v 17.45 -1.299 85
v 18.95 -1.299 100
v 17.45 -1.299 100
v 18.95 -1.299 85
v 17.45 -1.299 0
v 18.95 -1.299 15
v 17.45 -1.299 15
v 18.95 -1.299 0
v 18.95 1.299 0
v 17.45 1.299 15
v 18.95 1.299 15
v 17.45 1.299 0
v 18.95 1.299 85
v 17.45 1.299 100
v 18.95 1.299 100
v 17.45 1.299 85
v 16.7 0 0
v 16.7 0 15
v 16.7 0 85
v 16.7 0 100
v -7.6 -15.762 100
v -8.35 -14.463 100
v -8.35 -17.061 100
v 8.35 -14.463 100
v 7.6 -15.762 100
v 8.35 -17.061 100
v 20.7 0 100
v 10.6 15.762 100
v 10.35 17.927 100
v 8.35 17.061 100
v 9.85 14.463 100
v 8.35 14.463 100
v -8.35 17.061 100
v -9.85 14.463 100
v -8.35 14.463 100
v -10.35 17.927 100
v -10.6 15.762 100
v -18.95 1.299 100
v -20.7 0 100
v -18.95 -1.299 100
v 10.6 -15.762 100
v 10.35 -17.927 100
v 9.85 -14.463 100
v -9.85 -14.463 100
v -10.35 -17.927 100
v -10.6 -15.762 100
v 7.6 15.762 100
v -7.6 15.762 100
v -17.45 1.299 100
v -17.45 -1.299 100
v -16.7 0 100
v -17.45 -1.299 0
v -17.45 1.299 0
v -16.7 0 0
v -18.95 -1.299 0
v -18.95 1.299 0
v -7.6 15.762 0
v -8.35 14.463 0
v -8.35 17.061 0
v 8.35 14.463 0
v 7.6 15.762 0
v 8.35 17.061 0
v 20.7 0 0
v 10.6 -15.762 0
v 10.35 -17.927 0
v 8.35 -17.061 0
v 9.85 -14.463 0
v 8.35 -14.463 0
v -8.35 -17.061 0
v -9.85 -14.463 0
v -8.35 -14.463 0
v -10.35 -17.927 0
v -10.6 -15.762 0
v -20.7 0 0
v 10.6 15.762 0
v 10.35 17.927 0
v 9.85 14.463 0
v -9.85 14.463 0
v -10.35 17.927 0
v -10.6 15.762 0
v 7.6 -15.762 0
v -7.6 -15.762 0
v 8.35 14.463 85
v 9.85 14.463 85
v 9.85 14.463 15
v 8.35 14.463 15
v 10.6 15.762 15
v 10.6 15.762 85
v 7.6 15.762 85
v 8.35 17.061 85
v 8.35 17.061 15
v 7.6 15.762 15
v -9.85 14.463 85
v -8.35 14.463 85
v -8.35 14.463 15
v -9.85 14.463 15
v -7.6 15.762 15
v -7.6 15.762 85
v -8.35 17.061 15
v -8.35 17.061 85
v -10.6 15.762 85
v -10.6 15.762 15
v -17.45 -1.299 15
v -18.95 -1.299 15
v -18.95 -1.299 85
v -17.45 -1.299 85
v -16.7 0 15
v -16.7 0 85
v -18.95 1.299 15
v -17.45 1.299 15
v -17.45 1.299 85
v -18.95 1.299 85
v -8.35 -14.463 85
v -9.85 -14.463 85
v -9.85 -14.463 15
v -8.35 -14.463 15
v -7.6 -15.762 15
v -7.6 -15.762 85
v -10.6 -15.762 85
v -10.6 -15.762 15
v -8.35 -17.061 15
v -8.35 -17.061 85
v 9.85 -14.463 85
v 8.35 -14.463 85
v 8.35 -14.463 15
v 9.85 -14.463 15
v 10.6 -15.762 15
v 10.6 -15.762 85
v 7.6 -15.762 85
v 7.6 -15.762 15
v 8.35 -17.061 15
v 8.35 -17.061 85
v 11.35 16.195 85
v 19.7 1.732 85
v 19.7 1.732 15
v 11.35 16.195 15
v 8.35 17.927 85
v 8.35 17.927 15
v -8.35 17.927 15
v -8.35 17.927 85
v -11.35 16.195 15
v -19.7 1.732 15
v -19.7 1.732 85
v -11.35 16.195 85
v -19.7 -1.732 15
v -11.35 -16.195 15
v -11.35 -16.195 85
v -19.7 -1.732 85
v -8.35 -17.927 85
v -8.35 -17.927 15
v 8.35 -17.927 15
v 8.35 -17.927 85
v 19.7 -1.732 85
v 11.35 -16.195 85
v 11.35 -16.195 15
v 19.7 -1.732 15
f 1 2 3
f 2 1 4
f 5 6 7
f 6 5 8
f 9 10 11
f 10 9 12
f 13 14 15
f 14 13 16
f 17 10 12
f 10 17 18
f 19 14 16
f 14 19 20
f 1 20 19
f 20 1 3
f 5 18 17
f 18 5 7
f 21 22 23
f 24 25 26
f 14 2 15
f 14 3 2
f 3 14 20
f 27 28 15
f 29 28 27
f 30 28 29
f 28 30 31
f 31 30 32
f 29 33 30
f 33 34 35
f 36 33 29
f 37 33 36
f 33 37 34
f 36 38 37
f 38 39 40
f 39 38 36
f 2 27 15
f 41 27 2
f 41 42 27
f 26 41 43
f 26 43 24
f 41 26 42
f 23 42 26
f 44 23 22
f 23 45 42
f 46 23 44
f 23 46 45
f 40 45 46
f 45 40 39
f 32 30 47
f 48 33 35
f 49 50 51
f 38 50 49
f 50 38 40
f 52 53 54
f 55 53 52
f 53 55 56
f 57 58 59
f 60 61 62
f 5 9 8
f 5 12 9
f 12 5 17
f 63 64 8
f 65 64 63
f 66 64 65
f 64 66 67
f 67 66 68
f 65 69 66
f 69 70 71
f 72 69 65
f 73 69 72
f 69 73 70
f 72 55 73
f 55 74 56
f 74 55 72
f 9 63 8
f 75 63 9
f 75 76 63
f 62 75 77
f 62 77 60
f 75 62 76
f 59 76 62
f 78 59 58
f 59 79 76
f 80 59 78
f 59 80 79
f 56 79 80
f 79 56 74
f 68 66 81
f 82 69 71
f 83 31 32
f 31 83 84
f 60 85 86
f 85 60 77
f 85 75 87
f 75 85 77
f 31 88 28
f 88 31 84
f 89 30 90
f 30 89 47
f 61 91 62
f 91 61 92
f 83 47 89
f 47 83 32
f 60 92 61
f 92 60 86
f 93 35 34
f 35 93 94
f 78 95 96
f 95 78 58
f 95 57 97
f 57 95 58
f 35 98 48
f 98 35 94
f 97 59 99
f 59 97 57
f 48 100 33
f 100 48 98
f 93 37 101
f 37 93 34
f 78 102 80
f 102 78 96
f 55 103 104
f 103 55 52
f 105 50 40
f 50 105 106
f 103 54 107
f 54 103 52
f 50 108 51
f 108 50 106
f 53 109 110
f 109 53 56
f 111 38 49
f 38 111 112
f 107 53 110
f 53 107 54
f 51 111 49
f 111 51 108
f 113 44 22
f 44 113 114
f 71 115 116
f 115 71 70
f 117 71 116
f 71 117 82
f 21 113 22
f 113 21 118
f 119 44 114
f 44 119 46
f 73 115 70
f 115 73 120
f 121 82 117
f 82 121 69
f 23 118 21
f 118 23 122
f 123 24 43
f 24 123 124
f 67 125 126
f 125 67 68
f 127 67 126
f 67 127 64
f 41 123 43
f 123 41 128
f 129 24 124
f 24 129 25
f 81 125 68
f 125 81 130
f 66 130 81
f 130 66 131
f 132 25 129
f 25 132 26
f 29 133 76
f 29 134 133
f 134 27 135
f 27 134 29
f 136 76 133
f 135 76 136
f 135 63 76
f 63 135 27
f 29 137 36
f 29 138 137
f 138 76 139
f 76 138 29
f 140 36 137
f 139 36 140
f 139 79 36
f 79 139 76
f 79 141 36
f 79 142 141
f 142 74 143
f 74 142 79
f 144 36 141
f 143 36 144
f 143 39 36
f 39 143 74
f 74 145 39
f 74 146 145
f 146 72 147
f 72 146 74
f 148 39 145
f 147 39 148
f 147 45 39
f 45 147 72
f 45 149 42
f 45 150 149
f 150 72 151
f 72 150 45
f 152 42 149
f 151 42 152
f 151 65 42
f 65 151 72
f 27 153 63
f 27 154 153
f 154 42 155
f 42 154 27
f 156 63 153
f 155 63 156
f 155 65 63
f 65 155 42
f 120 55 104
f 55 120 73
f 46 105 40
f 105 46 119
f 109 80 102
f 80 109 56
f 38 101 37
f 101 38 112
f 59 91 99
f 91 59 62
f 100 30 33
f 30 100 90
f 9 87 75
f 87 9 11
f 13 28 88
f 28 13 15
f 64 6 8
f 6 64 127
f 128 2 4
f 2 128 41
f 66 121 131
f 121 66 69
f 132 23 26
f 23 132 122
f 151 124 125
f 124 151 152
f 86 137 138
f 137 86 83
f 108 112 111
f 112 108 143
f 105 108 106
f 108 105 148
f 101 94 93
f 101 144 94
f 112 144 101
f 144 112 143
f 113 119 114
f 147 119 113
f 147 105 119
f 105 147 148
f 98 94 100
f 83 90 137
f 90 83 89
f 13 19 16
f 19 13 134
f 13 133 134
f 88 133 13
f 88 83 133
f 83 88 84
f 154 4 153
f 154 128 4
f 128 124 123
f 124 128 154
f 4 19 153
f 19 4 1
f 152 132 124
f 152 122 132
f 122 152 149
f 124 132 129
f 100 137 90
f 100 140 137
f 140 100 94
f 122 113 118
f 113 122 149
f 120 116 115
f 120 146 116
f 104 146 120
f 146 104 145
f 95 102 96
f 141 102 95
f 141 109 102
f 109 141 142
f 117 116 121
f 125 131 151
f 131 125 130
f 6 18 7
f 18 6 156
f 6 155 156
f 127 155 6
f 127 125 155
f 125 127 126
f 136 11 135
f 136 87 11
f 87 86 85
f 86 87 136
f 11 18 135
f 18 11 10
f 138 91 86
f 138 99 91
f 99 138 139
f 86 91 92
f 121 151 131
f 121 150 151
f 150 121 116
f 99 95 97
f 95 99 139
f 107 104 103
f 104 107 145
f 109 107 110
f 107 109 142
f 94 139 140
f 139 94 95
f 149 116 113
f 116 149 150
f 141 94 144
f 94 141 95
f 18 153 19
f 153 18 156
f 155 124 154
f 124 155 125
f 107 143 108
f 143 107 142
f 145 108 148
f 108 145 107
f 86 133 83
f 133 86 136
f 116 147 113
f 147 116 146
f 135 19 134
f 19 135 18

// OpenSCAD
height = 100;
outter_shell = 20.7;
shell_thickness = 1;
inner_shell = outter_shell - shell_thickness;
post_radius = 1.5;
port_width = inner_shell-2*post_radius;
port_offset = 15;
port_height = height - port_offset*2;
a = inner_shell - post_radius;
port_tool_width = outter_shell*2.5;


difference () {
    union () {
        hex_posts(a, height);
        shell(outter_shell, shell_thickness, height);
    }

    port_tool();
}

module port_tool() {
    rotate([0,0,0])
    translate([-(port_width)/2,-port_tool_width/2,port_offset])
    cube([port_width,port_tool_width,port_height]);
    
    rotate([0,0,60])
    translate([-(port_width)/2,-port_tool_width/2,port_offset])
    cube([port_width,port_tool_width,port_height]);

    rotate([0,0,120])
    translate([-(port_width)/2,-port_tool_width/2,port_offset])
    cube([port_width,port_tool_width,port_height]);
}

module shell(radius, thickness, height) {
    linear_extrude(height = height, convexity = 10, twist = 0)
    difference() {
        hexagon(radius);
    
        hexagon(radius-thickness);
    }
}

module hex_posts(a, height) {
    h = a*sqrt(3)/2;
    translate([a,0,0])
    cylinder(h = height, r1 = post_radius, r2 = post_radius, $fn=6);

    translate([a/2,h,0])
    cylinder(h = height, r1 = post_radius, r2 = post_radius, $fn=6);

    translate([-a/2,h,0])
    cylinder(h = height, r1 = post_radius, r2 = post_radius, $fn=6);

    translate([-a,0,0])
    cylinder(h = height, r1 = post_radius, r2 = post_radius, $fn=6);

    translate([-a/2,-h,0])
    cylinder(h = height, r1 = post_radius, r2 = post_radius, $fn=6);

    translate([a/2,-h,0])
    cylinder(h = height, r1 = post_radius, r2 = post_radius, $fn=6);
}
module hexagon(a){
    h = a*sqrt(3)/2;
    polygon(
        points=[[a,0], [a/2,h], [-a/2,h], [-a,0], [-a/2,-h], [a/2,-h]]
    );
}
